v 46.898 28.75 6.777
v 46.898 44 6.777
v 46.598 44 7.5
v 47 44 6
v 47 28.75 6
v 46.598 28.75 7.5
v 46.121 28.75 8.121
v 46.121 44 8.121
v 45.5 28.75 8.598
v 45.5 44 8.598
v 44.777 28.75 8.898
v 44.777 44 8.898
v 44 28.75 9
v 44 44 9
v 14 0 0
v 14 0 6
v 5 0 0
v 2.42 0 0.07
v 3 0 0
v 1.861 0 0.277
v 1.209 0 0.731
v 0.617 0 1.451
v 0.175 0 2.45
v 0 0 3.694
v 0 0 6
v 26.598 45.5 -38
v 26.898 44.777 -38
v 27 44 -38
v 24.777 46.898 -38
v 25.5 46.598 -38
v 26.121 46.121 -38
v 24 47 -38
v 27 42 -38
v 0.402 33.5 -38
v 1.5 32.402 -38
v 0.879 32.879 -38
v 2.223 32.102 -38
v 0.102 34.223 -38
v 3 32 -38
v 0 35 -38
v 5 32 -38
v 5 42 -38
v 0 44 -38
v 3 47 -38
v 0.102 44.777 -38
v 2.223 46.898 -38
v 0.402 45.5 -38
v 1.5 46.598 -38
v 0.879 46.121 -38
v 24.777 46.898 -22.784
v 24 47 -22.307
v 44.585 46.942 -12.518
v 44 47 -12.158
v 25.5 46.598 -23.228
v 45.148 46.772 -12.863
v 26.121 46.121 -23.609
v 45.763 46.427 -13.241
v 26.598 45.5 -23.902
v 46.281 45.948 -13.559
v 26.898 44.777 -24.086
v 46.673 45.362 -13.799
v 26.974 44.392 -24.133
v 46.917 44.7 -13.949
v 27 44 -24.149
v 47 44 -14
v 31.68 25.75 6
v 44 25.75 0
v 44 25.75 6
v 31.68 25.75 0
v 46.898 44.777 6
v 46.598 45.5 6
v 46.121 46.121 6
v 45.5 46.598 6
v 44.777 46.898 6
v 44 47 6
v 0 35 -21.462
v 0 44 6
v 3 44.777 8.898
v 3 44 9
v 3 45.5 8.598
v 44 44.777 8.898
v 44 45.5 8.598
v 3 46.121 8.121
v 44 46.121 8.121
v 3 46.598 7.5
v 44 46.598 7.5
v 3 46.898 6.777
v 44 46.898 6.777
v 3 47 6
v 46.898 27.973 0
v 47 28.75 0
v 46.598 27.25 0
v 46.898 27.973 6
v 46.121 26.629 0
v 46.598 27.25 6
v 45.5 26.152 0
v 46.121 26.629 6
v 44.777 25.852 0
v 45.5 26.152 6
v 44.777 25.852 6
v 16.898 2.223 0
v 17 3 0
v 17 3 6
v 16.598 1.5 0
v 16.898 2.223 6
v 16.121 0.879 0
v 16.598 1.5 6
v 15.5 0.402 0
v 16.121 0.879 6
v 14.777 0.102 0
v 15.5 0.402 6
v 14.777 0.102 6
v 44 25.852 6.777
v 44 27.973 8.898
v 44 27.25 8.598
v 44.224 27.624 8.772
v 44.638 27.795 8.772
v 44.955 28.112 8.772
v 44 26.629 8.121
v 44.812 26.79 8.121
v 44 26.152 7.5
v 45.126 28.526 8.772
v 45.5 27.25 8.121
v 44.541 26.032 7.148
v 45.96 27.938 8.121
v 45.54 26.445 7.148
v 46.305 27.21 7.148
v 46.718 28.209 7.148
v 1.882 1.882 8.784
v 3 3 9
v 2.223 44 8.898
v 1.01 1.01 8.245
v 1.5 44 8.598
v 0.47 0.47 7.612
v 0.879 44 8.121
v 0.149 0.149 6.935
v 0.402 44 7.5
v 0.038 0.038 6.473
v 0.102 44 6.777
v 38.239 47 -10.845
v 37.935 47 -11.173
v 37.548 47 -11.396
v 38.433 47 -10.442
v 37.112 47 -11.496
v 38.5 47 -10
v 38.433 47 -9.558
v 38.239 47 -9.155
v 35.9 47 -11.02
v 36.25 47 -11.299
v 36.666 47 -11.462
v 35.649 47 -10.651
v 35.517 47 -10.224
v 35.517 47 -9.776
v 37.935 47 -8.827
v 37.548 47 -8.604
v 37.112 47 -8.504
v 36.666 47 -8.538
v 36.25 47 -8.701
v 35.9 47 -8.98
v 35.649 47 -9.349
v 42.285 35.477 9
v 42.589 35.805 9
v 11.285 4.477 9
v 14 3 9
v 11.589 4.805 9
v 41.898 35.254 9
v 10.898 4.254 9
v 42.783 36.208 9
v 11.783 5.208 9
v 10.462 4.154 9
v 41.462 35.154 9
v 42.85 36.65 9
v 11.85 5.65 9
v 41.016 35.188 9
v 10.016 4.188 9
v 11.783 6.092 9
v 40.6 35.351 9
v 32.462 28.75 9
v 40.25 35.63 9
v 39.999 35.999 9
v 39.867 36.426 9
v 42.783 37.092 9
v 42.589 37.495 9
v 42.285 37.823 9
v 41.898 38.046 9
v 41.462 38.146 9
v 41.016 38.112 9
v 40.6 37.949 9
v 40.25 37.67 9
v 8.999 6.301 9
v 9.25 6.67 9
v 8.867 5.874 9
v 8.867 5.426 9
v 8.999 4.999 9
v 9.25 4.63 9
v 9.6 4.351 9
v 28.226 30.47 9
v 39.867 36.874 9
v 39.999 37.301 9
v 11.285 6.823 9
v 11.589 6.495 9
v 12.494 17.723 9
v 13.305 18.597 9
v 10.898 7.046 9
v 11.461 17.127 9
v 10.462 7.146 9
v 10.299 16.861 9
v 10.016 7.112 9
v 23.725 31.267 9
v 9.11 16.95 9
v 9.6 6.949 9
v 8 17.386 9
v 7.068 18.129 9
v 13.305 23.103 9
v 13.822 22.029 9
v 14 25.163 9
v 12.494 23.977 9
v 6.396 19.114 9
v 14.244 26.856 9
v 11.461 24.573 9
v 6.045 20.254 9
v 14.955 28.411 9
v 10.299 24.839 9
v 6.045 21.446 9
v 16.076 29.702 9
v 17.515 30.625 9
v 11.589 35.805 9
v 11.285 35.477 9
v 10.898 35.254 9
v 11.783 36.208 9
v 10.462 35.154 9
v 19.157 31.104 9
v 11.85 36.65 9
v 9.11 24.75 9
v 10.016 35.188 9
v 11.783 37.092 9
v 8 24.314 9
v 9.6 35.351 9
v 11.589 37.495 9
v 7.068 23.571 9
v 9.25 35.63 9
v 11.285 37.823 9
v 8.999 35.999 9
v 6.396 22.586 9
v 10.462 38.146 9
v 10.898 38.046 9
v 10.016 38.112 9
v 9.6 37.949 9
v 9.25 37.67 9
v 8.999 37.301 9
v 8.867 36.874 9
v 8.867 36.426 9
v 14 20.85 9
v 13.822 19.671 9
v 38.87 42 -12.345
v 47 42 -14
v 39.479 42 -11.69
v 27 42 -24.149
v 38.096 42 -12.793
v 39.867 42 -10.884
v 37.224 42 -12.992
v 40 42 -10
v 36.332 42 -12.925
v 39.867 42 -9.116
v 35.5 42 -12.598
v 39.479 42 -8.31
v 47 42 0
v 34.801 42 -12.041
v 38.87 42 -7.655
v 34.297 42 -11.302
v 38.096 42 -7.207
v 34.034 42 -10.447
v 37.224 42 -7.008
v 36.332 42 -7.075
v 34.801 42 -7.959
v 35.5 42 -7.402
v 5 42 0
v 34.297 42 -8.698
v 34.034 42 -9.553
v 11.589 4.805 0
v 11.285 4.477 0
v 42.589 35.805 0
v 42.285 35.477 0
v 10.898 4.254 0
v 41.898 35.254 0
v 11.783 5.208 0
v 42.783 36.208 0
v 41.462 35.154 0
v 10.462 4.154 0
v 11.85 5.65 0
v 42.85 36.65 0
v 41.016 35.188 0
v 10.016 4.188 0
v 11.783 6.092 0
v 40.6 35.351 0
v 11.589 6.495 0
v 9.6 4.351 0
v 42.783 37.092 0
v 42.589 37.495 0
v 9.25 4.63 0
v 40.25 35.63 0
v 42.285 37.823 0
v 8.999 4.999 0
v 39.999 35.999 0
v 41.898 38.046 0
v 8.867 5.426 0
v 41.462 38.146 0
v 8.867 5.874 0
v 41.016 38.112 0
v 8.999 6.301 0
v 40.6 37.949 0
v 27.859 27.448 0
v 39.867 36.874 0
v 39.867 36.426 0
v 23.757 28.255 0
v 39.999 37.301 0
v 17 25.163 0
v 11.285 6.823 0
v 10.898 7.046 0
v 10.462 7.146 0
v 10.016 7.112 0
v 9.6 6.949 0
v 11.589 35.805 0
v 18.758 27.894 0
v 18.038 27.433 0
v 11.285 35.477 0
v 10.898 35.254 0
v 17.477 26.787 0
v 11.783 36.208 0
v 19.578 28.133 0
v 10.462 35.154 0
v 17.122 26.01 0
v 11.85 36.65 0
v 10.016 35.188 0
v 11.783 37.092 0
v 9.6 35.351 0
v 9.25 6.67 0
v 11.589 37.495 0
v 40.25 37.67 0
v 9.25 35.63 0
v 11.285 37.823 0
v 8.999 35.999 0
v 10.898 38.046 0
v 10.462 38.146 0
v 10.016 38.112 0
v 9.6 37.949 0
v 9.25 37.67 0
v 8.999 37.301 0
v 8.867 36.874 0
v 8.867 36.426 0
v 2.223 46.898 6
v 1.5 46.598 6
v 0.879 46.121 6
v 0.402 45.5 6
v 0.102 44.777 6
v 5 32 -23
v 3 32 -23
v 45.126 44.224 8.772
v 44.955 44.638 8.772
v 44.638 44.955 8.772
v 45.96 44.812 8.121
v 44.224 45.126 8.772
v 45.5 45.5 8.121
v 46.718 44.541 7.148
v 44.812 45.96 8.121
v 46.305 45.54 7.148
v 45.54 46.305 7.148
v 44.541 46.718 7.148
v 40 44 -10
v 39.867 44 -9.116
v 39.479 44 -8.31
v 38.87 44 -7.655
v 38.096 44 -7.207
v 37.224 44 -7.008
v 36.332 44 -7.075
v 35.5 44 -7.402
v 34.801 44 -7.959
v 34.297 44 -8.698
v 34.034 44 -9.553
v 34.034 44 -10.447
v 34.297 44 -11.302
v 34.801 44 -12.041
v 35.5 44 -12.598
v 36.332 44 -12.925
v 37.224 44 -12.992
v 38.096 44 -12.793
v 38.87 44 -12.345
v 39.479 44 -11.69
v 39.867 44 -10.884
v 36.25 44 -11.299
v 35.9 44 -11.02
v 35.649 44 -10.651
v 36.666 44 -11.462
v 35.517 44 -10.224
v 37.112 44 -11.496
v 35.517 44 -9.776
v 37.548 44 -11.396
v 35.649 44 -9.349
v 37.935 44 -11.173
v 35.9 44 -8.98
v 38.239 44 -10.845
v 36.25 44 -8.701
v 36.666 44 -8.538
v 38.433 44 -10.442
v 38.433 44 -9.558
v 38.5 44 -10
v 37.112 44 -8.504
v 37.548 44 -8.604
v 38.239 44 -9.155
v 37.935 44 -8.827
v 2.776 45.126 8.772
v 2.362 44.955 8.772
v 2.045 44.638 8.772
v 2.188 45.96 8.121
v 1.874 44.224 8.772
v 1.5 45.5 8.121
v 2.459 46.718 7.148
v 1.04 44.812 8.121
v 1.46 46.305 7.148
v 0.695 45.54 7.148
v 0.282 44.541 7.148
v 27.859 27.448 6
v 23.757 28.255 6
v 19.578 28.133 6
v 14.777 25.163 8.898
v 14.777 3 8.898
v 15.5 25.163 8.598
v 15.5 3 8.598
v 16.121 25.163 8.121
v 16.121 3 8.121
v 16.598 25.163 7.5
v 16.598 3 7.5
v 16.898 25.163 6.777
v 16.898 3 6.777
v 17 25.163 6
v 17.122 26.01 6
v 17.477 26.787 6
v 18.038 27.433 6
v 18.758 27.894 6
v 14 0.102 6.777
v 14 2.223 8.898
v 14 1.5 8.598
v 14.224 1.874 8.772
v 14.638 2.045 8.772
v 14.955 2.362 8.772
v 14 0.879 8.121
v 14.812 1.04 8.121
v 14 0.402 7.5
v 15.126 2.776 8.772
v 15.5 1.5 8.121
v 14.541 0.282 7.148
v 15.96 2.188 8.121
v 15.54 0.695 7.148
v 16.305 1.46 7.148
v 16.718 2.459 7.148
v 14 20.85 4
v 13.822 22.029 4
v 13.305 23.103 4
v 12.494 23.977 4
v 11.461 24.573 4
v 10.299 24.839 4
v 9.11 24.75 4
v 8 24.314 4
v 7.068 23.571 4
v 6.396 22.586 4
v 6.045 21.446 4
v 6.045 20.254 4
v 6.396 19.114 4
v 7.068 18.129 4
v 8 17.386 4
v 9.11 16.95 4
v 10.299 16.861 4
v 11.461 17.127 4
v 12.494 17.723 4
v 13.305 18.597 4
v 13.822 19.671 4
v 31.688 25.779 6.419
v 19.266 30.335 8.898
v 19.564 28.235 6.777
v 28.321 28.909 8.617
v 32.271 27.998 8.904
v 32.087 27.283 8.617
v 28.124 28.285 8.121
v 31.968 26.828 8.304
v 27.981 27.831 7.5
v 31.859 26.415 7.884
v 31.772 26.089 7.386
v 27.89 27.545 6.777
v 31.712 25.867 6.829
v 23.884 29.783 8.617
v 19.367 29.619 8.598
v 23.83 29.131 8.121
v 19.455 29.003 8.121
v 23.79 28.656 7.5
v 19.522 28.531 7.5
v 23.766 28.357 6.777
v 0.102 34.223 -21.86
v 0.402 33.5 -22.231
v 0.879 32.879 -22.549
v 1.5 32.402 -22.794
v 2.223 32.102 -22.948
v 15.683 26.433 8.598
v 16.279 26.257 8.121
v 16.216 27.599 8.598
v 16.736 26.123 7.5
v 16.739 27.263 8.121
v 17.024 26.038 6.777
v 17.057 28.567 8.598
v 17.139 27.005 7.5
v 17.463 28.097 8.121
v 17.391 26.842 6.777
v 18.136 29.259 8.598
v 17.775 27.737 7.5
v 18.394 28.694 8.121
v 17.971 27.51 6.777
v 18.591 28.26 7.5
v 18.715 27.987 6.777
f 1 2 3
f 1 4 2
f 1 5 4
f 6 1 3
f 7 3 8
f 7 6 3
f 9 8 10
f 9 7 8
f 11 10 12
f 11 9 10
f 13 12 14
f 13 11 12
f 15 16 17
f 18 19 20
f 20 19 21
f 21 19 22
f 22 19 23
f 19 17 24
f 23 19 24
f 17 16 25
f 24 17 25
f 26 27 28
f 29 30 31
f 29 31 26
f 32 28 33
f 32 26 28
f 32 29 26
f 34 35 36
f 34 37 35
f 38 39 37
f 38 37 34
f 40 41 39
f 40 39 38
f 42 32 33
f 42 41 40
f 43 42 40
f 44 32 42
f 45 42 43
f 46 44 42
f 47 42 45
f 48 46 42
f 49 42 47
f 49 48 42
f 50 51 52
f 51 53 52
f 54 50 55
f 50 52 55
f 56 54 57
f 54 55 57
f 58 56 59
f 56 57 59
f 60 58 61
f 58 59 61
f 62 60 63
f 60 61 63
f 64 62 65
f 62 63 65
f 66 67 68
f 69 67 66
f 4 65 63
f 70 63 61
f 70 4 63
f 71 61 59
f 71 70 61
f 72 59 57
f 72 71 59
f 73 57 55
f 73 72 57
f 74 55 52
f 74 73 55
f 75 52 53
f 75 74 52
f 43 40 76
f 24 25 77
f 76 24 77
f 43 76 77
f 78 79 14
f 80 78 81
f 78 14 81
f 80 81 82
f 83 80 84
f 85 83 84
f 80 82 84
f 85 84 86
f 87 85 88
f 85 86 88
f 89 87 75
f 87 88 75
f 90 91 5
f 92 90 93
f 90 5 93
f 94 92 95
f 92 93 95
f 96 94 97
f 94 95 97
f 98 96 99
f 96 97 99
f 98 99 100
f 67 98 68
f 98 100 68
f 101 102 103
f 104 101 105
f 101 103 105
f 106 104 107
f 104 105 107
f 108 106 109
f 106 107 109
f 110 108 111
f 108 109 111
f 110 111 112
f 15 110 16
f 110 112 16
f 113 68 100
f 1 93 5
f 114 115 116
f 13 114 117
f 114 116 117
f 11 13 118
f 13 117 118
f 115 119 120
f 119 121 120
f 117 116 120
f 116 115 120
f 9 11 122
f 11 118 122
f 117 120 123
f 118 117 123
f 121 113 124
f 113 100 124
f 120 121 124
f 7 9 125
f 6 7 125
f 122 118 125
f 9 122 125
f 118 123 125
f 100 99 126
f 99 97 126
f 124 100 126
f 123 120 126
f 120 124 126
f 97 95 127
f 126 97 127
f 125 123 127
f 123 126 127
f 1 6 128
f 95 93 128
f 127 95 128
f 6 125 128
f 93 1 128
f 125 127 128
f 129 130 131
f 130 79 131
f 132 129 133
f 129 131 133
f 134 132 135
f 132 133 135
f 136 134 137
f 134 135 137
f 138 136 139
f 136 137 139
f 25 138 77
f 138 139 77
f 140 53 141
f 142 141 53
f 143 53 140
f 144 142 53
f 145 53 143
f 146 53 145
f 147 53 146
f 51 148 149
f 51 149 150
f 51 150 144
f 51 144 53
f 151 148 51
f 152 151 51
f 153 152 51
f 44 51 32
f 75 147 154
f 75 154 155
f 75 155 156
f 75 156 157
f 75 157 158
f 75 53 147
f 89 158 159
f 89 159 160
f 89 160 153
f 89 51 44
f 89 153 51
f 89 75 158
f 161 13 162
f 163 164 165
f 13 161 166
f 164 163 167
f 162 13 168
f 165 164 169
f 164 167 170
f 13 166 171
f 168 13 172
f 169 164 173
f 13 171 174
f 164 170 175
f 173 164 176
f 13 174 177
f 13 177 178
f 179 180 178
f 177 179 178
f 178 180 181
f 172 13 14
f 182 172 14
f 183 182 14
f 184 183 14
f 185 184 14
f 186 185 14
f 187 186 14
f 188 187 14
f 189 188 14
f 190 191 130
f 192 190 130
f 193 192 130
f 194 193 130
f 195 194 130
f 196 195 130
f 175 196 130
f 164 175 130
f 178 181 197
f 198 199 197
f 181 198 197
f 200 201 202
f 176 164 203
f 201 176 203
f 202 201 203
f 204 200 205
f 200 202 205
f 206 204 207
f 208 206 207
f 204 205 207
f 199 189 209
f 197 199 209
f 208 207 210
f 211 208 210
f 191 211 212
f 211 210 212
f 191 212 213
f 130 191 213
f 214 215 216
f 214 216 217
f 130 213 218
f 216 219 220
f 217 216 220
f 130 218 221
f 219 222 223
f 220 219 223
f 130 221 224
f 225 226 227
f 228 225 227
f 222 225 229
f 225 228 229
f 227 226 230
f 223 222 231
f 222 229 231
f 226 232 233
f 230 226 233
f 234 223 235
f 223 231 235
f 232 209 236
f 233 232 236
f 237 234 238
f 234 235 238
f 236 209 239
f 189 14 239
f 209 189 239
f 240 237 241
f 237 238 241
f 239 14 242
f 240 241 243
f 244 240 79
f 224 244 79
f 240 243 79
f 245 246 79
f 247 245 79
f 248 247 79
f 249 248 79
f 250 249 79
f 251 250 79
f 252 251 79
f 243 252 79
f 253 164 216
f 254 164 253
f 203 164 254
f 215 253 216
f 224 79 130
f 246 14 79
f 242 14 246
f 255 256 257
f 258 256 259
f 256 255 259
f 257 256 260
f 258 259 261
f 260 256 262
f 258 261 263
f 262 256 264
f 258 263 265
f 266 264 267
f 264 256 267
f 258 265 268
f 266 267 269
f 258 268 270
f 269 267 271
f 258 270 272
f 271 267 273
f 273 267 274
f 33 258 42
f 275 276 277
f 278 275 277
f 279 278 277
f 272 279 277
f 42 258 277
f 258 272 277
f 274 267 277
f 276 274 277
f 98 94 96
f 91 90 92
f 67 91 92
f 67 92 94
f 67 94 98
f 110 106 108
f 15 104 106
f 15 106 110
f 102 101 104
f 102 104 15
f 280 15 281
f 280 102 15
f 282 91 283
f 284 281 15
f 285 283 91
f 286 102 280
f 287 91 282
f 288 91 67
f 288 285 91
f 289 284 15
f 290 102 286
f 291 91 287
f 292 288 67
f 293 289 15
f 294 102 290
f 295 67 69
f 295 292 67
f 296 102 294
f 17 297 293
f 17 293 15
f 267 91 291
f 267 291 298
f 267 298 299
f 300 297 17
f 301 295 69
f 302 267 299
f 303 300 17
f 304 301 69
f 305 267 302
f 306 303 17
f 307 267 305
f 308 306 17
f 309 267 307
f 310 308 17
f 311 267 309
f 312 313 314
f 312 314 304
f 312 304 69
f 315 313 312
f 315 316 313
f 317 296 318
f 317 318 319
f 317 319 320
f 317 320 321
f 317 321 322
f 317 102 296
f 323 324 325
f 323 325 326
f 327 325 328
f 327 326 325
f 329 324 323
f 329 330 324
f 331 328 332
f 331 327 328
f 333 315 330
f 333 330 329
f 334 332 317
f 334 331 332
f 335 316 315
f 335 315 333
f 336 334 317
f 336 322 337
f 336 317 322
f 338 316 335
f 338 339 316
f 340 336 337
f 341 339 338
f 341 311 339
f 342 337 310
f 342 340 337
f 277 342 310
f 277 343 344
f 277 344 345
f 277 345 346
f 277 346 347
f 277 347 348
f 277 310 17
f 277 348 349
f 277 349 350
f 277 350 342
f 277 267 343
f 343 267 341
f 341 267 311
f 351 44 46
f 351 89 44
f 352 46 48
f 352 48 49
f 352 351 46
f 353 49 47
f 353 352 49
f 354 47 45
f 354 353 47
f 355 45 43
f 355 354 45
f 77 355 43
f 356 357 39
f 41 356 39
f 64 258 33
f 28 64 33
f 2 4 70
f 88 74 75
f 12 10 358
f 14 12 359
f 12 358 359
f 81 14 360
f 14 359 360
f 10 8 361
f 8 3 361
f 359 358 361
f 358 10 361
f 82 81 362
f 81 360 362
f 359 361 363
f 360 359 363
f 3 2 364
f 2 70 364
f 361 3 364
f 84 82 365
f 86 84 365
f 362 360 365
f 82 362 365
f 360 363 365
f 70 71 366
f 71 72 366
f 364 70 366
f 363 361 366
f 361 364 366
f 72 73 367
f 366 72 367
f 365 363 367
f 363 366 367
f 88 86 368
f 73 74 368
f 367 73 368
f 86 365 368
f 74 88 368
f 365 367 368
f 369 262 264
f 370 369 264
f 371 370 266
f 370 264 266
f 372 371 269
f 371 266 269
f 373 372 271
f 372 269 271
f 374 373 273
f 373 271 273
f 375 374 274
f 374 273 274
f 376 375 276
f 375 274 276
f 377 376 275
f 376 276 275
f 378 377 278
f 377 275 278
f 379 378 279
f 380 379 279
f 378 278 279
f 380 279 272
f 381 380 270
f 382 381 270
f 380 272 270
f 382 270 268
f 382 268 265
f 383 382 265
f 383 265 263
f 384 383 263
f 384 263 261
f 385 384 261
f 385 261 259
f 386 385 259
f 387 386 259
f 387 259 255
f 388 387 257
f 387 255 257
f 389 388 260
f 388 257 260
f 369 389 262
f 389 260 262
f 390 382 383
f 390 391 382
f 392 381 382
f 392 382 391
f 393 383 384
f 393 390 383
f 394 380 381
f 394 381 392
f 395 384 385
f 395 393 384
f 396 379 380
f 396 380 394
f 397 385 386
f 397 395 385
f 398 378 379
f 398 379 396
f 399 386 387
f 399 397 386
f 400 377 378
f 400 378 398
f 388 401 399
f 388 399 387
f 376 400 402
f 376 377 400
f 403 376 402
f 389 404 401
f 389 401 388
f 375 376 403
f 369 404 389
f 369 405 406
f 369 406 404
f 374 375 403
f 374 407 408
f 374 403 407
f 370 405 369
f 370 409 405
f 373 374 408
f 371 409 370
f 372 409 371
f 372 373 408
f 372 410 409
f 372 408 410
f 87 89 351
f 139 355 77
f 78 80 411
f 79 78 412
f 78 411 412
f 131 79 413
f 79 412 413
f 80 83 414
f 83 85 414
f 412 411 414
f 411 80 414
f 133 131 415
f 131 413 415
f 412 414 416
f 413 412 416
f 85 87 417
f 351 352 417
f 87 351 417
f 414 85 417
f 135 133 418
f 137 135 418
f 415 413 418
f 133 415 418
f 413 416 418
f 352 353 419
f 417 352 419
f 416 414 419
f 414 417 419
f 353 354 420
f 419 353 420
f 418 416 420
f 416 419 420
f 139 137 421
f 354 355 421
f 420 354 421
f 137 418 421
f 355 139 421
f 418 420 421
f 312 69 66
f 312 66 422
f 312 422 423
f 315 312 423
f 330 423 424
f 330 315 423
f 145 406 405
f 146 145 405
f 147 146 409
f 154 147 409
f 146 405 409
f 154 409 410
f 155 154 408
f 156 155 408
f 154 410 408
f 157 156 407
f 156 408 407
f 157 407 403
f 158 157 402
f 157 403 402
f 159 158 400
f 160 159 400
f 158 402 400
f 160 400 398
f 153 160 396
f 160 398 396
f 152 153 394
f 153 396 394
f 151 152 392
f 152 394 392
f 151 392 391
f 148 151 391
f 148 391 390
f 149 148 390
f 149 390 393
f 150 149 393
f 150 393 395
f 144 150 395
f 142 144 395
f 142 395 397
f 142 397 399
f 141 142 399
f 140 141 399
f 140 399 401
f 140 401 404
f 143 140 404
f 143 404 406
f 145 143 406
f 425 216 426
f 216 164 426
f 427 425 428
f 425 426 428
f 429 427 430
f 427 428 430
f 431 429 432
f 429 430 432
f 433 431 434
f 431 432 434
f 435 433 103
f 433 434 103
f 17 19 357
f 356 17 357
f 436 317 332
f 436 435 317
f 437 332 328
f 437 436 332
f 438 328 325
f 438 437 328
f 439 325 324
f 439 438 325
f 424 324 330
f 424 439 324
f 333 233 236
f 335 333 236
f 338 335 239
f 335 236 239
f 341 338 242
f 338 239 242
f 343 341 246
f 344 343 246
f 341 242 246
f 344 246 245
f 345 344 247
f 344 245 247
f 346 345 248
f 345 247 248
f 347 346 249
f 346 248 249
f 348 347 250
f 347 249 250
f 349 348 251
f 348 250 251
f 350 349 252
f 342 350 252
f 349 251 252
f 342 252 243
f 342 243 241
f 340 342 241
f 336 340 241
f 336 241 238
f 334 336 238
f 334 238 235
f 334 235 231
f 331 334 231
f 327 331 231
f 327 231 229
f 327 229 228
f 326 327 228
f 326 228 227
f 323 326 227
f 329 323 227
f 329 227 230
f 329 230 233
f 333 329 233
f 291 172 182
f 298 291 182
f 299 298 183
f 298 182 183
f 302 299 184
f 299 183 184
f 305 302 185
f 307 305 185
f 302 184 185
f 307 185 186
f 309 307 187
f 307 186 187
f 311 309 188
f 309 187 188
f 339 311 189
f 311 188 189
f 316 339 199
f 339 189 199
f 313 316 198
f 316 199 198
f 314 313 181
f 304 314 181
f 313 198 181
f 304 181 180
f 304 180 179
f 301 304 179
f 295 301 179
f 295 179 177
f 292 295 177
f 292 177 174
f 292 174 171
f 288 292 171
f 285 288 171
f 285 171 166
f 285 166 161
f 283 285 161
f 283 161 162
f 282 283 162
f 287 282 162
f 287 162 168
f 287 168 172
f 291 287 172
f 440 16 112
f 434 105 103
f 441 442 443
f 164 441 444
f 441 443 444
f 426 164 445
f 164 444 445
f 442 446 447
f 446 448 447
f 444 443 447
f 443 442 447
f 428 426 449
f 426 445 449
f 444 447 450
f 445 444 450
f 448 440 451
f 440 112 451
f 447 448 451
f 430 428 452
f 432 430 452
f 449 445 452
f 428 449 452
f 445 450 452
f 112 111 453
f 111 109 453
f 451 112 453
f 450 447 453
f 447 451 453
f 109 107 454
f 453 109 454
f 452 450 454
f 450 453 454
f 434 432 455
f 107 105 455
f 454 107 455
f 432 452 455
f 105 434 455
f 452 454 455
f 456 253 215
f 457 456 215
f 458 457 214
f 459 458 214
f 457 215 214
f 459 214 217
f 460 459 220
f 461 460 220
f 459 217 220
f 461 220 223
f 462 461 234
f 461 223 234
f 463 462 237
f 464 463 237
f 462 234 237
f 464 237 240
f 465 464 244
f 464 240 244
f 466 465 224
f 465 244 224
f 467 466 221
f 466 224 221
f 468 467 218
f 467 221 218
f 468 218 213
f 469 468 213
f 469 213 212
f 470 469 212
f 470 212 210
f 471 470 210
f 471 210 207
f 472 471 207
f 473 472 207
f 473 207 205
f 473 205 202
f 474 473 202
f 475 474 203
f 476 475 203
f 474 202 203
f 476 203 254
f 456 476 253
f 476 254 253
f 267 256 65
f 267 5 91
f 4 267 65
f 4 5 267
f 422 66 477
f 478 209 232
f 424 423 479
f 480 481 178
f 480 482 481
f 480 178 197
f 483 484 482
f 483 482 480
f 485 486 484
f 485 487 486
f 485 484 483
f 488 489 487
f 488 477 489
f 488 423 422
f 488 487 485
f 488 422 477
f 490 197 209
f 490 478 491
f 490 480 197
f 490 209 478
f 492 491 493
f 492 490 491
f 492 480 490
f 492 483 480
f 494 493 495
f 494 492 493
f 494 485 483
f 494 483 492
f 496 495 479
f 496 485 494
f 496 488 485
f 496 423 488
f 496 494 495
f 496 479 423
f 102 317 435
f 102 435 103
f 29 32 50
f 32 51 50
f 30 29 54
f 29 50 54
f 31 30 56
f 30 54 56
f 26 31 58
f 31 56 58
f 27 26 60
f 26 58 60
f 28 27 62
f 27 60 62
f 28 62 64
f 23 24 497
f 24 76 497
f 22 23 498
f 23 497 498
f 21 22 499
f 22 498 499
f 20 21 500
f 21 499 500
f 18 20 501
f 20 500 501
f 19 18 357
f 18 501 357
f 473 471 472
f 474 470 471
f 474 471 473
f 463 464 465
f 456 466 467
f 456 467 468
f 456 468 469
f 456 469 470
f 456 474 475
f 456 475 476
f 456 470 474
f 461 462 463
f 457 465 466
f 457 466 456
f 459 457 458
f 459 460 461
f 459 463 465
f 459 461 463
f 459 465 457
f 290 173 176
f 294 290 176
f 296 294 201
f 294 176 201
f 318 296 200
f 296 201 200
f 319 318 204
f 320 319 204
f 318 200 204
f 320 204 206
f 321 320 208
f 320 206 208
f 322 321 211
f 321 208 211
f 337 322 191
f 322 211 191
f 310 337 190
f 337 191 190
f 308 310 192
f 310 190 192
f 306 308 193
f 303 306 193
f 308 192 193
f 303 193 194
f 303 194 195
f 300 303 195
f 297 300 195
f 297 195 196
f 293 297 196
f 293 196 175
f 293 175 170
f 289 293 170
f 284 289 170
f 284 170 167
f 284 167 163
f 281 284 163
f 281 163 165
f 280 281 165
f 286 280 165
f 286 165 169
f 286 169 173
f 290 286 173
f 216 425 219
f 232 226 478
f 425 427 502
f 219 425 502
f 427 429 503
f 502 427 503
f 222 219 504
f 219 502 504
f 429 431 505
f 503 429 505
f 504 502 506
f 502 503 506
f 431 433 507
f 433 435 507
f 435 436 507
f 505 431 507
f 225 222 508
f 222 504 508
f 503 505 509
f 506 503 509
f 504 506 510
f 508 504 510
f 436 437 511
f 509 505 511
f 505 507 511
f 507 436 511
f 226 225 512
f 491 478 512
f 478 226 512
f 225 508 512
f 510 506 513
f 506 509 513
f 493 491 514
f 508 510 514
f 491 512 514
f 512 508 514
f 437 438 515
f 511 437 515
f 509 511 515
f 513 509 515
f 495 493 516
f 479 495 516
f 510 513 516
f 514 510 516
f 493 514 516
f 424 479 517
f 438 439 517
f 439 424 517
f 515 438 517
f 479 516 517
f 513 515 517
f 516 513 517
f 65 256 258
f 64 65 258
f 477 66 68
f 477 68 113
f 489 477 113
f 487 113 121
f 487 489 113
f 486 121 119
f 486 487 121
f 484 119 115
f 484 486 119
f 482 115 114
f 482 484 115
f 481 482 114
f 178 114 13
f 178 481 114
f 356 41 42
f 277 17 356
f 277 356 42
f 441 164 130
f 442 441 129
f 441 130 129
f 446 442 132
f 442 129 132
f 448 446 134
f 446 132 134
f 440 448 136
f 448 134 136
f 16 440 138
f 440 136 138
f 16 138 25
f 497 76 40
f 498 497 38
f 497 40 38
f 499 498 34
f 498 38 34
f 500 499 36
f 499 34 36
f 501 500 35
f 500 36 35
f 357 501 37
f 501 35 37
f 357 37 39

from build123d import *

# Parameters (mm, degrees)
BOSS_EXTRUDE1_DEPTH = 9
SKETCH3_R           = 1.5
CUT_EXTRUDE1_DEPTH  = 10
SKETCH8_W           = 5
SKETCH8_H           = 47
BOSS_EXTRUDE2_DEPTH = 38
SKETCH9_W           = 42
SKETCH9_H           = 5
BOSS_EXTRUDE3_DEPTH = 38
CUT_EXTRUDE2_DEPTH  = 38
SKETCH11_R          = 4
CUT_EXTRUDE3_DEPTH  = 5
CUT_EXTRUDE4_DEPTH  = 10
SKETCH13_R          = 1.5
CUT_EXTRUDE5_DEPTH  = 74.600271739
SKETCH14_R          = 3
CUT_EXTRUDE6_DEPTH  = 2
FILLET1_R           = 3


with BuildPart() as part:
    # Sketch2 → Boss-Extrude1 (new body)
    with BuildSketch(Plane.XY):
        with BuildLine():
            Line((0, 0), (0, 47))
            Line((0, 47), (47, 47))
            Line((47, 47), (47, 25.75))
            Line((47, 25.75), (31.68, 25.75))
            ThreePointArc((31.68, 25.75), (24.5283031, 28.175540714), (17, 27.58))
            Line((17, 27.58), (17, 0))
            Line((17, 0), (0, 0))
        make_face()
    extrude(amount=BOSS_EXTRUDE1_DEPTH)

    # Sketch3 → Cut-Extrude1 (cut)
    with BuildSketch(Plane.XY.offset(9)):
        with Locations((10.35, 5.65)):
            Circle(SKETCH3_R)
        with Locations((10.35, 36.65)):
            Circle(SKETCH3_R)
        with Locations((41.35, 36.65)):
            Circle(SKETCH3_R)
    extrude(amount=-CUT_EXTRUDE1_DEPTH, mode=Mode.SUBTRACT)

    # Sketch8 → Boss-Extrude2 (add)
    with BuildSketch(Plane(origin=(0, 0, 0), x_dir=(-1, 0, 0), z_dir=(0, 0, -1))):
        with Locations((-2.5, 23.5)):
            Rectangle(SKETCH8_W, SKETCH8_H)
    extrude(amount=BOSS_EXTRUDE2_DEPTH)

    # Sketch9 → Boss-Extrude3 (add)
    with BuildSketch(Plane(origin=(0, 0, 0), x_dir=(-1, 0, 0), z_dir=(0, 0, -1))):
        with Locations((-26, 44.5)):
            Rectangle(SKETCH9_W, SKETCH9_H)
    extrude(amount=BOSS_EXTRUDE3_DEPTH)

    # Sketch10 → Cut-Extrude2 (cut)
    with BuildSketch(Plane.ZY):
        Polygon((0, 0), (-23, 32), (-38, 32), (-38, 0), align=None)
    extrude(amount=-CUT_EXTRUDE2_DEPTH, mode=Mode.SUBTRACT)

    # Sketch11 → Cut-Extrude3 (cut)
    with BuildSketch(Plane.XY.offset(9)):
        with Locations((10, 20.85)):
            Circle(SKETCH11_R)
    extrude(amount=-CUT_EXTRUDE3_DEPTH, mode=Mode.SUBTRACT)

    # Sketch12 → Cut-Extrude4 (cut)
    with BuildSketch(Plane.XZ.offset(-42)):
        Polygon((47, -38), (47, -14), (27, -24.148784343), (27, -38), align=None)
    extrude(amount=-CUT_EXTRUDE4_DEPTH, mode=Mode.SUBTRACT)

    # Sketch13 → Cut-Extrude5 (cut, through all)
    with BuildSketch(Plane.XZ.offset(-42)):
        with Locations((37, -10)):
            Circle(SKETCH13_R)
    extrude(amount=-CUT_EXTRUDE5_DEPTH, mode=Mode.SUBTRACT)

    # Sketch14 → Cut-Extrude6 (cut)
    with BuildSketch(Plane(origin=(0, 42, 0), x_dir=(-1, 0, 0), z_dir=(0, -1, 0))):
        with Locations(Location((-37, 10, 0), (0, 0, 180))):
            Circle(SKETCH14_R)
    extrude(amount=-CUT_EXTRUDE6_DEPTH, mode=Mode.SUBTRACT)

    # Fillet1
    fillet1_edges = [part.edges().sort_by_distance(p)[0] for p in [
        (24.5283031, 28.175540714, 9),
        (0, 47, -14.5),
        (47, 47, -2.5),
        (47, 25.75, 4.5),
        (17, 27.58, 4.5),
        (17, 0, 4.5),
        (39.34, 25.75, 9),
        (47, 36.375, 9),
        (23.5, 47, 9),
        (0, 23.5, 9),
        (8.5, 0, 9),
        (17, 13.79, 9),
        (0, 16, -11.5),
        (0, 32, -30.5),
        (27, 47, -31.074392172),
        (37, 47, -19.074392172),
    ]]
    fillet(fillet1_edges, radius=FILLET1_R - 0.0001)  # a hair under: the kernel refuses the full size


solid = part.part
